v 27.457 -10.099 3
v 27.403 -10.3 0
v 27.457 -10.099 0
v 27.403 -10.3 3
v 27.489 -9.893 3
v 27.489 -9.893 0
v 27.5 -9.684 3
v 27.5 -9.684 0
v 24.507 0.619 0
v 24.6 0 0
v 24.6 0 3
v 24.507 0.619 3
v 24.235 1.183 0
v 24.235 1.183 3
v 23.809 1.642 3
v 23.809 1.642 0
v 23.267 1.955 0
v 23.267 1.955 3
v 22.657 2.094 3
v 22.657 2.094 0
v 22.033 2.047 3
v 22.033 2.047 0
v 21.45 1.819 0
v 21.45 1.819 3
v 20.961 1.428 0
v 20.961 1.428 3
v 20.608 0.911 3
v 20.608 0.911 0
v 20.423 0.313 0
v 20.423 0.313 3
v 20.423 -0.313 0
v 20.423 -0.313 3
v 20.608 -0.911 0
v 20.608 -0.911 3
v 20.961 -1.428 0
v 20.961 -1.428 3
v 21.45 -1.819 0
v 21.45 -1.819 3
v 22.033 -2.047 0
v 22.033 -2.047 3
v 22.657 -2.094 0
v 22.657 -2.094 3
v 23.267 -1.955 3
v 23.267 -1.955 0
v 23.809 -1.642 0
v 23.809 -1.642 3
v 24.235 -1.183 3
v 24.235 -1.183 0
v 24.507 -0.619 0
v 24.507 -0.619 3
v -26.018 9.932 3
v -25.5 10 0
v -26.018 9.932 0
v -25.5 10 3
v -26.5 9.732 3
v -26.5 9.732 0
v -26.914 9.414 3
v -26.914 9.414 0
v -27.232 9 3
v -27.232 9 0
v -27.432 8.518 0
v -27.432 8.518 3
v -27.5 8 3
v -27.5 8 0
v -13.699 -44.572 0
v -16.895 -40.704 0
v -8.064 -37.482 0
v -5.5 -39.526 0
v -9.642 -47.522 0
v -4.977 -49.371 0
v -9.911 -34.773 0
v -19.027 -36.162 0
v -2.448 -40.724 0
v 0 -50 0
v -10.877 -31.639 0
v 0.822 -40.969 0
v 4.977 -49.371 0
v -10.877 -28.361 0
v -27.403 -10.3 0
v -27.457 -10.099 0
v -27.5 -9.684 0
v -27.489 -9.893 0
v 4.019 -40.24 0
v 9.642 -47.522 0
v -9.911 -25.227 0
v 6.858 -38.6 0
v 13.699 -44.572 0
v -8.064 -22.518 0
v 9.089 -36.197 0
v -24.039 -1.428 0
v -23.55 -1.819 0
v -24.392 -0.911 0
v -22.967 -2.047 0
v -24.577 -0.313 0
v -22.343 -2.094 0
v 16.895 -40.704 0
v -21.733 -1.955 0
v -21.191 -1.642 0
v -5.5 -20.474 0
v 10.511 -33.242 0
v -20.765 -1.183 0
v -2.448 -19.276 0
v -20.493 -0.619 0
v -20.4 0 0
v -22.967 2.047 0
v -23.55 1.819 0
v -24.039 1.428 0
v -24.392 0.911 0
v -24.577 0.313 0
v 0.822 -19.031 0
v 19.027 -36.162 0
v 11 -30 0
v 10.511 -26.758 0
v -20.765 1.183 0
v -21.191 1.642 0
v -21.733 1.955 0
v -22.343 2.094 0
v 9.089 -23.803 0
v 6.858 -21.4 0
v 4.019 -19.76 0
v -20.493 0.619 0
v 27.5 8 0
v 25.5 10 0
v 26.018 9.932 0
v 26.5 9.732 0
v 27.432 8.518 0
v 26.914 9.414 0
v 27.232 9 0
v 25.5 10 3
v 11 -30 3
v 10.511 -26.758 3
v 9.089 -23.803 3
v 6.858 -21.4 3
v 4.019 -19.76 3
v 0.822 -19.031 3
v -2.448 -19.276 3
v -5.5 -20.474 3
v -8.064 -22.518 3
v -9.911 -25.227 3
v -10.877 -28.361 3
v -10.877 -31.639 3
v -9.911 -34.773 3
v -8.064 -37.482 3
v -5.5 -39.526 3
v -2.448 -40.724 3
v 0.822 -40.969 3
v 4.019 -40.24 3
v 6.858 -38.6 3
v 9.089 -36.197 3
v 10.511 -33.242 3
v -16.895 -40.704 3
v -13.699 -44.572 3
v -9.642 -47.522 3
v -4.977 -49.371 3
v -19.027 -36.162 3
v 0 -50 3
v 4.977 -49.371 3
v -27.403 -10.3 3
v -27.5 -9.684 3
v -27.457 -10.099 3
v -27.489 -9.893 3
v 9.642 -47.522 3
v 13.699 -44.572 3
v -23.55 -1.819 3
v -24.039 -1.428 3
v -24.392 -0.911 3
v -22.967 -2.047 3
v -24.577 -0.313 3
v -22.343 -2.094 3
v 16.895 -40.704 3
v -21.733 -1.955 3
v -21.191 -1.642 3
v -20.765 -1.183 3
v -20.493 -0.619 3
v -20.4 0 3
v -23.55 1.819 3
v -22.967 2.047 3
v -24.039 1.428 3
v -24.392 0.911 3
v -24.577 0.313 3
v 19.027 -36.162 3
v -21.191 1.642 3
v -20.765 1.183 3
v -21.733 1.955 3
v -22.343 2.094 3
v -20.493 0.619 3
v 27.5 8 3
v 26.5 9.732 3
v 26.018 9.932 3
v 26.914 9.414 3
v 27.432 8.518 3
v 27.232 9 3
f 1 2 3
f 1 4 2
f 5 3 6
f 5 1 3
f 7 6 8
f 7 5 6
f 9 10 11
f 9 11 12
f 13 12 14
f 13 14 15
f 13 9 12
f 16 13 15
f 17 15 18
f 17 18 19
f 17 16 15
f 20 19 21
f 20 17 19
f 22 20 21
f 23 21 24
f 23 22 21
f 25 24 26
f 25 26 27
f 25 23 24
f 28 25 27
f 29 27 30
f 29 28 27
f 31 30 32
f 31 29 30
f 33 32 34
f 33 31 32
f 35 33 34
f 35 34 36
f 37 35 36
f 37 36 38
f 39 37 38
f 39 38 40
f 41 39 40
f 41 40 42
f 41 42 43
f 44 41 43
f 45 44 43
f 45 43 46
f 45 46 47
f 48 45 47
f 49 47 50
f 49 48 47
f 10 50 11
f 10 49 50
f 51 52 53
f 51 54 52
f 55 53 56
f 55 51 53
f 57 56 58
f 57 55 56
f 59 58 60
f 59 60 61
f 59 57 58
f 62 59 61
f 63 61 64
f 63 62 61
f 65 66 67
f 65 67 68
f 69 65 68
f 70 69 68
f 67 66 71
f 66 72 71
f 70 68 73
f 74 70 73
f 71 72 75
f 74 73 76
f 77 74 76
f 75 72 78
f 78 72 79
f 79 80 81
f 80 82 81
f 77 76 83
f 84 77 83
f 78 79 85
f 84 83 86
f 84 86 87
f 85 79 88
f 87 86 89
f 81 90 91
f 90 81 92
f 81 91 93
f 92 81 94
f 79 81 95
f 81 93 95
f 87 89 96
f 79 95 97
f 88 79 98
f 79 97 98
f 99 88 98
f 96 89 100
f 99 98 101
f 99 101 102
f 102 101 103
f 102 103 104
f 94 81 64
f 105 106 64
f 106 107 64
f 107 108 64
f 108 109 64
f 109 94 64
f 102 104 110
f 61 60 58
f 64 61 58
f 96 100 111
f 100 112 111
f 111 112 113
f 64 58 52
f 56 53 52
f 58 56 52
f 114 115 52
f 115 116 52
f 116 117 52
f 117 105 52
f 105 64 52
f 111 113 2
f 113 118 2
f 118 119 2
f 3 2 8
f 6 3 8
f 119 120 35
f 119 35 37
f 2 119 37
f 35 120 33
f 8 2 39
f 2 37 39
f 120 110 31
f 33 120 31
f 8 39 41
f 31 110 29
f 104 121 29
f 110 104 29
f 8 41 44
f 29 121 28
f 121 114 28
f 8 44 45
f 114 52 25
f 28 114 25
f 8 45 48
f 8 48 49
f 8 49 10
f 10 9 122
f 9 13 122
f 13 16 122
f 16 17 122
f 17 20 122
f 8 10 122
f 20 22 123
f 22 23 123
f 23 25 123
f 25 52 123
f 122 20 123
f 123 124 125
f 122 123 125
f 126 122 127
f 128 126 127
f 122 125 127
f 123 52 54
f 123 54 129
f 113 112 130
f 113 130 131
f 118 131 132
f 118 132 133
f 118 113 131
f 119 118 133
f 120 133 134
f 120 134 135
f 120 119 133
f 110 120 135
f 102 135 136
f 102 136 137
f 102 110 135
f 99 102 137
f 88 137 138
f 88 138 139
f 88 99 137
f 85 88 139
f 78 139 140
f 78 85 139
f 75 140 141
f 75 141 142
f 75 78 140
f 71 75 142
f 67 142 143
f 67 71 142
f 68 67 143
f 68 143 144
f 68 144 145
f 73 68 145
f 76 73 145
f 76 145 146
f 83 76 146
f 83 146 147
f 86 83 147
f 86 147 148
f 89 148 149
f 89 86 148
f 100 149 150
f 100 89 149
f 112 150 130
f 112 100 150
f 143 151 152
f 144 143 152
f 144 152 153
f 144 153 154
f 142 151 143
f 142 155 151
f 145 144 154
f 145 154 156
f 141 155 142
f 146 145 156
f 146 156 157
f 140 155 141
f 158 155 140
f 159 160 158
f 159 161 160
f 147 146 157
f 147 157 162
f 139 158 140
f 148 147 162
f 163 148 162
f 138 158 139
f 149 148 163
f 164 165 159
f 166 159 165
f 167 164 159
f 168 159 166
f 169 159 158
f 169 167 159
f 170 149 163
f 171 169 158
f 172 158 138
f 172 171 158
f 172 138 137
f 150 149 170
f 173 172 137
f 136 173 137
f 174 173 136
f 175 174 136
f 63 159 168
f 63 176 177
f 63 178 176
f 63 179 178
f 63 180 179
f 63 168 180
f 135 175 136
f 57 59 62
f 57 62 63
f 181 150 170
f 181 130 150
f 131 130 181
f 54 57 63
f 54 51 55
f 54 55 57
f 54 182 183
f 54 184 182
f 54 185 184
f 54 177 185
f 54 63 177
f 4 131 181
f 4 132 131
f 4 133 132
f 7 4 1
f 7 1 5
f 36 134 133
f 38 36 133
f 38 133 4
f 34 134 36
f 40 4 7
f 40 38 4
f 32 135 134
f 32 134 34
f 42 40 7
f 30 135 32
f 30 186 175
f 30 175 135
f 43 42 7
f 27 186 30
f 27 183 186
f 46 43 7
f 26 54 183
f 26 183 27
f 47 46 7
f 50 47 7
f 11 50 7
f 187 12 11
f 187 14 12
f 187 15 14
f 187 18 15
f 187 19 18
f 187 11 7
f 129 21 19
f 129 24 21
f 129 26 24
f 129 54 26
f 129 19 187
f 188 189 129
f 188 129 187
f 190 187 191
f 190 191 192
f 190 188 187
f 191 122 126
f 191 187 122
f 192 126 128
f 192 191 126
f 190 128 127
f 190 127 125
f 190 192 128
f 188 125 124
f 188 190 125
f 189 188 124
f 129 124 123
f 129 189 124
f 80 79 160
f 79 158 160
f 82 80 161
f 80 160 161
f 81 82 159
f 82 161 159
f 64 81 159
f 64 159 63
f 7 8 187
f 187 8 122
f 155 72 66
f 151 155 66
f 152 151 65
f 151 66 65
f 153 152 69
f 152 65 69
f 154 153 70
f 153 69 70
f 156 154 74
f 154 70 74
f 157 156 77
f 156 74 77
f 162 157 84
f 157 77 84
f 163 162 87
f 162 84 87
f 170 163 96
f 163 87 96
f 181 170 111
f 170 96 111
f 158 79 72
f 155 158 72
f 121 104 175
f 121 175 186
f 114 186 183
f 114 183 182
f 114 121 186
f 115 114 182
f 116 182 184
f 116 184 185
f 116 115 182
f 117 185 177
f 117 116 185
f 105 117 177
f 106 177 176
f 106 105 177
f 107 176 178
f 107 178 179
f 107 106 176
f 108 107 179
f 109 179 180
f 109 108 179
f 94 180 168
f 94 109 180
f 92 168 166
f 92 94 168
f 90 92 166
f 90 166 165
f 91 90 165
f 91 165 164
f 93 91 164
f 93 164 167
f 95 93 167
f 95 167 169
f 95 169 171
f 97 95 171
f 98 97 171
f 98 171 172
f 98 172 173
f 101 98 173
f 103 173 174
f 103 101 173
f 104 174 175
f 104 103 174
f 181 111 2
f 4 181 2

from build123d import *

# Parameters (mm, degrees)
SKETCH_1_W      = 55
SKETCH_1_H      = 20
SKETCH_1_R      = 2.1
SKETCH_1_R_2    = 20
SKETCH_1_R_3    = 11
EXTRUDE_1_DEPTH = 3
FILLET_1_R      = 2


with BuildPart() as part:
    # ｽｹｯﾁ1 → ﾎﾞｽ - 押し出し1 (new body)
    # profile 1 of 4: a face of its own
    with BuildSketch(Plane.XY):
        Rectangle(SKETCH_1_W, SKETCH_1_H)
        with Locations((22.5, 0)):
            Circle(SKETCH_1_R, mode=Mode.SUBTRACT)
        with Locations((-22.5, 0)):
            Circle(SKETCH_1_R, mode=Mode.SUBTRACT)
    # profile 2 of 4: a face of its own
    with BuildSketch(Plane.XY):
        with BuildLine():
            Line((1.9e-08, -10), (-27.5, -10))
            Line((-27.5, -10), (-19.027027027, -36.162162162))
            ThreePointArc((-19.027027027, -36.162162162), (-16.174721681, -18.236566039), (1.9e-08, -10))
        make_face()
    # profile 3 of 4: a face of its own
    with BuildSketch(Plane.XY):
        with Locations((0, -30)):
            Circle(SKETCH_1_R_2)
        with Locations((0, -30)):
            Circle(SKETCH_1_R_3, mode=Mode.SUBTRACT)
    # profile 4 of 4: a face of its own
    with BuildSketch(Plane.XY):
        with BuildLine():
            Line((19.027027027, -36.162162162), (27.5, -10))
            Line((27.5, -10), (1.9e-08, -10))
            ThreePointArc((1.9e-08, -10), (14.14213563, -15.857864383), (20, -30))
            ThreePointArc((20, -30), (19.755259307, -33.119251469), (19.027027027, -36.162162162))
        make_face()
    extrude(amount=EXTRUDE_1_DEPTH)

    # ﾌｨﾚｯﾄ1
    fillet_1_edges = [part.edges().sort_by_distance(p)[0] for p in [
        (27.5, -10, 1.5),
        (-27.5, -10, 1.5),
        (-27.5, 10, 1.5),
        (27.5, 10, 1.5),
    ]]
    fillet(fillet_1_edges, radius=FILLET_1_R)


solid = part.part
